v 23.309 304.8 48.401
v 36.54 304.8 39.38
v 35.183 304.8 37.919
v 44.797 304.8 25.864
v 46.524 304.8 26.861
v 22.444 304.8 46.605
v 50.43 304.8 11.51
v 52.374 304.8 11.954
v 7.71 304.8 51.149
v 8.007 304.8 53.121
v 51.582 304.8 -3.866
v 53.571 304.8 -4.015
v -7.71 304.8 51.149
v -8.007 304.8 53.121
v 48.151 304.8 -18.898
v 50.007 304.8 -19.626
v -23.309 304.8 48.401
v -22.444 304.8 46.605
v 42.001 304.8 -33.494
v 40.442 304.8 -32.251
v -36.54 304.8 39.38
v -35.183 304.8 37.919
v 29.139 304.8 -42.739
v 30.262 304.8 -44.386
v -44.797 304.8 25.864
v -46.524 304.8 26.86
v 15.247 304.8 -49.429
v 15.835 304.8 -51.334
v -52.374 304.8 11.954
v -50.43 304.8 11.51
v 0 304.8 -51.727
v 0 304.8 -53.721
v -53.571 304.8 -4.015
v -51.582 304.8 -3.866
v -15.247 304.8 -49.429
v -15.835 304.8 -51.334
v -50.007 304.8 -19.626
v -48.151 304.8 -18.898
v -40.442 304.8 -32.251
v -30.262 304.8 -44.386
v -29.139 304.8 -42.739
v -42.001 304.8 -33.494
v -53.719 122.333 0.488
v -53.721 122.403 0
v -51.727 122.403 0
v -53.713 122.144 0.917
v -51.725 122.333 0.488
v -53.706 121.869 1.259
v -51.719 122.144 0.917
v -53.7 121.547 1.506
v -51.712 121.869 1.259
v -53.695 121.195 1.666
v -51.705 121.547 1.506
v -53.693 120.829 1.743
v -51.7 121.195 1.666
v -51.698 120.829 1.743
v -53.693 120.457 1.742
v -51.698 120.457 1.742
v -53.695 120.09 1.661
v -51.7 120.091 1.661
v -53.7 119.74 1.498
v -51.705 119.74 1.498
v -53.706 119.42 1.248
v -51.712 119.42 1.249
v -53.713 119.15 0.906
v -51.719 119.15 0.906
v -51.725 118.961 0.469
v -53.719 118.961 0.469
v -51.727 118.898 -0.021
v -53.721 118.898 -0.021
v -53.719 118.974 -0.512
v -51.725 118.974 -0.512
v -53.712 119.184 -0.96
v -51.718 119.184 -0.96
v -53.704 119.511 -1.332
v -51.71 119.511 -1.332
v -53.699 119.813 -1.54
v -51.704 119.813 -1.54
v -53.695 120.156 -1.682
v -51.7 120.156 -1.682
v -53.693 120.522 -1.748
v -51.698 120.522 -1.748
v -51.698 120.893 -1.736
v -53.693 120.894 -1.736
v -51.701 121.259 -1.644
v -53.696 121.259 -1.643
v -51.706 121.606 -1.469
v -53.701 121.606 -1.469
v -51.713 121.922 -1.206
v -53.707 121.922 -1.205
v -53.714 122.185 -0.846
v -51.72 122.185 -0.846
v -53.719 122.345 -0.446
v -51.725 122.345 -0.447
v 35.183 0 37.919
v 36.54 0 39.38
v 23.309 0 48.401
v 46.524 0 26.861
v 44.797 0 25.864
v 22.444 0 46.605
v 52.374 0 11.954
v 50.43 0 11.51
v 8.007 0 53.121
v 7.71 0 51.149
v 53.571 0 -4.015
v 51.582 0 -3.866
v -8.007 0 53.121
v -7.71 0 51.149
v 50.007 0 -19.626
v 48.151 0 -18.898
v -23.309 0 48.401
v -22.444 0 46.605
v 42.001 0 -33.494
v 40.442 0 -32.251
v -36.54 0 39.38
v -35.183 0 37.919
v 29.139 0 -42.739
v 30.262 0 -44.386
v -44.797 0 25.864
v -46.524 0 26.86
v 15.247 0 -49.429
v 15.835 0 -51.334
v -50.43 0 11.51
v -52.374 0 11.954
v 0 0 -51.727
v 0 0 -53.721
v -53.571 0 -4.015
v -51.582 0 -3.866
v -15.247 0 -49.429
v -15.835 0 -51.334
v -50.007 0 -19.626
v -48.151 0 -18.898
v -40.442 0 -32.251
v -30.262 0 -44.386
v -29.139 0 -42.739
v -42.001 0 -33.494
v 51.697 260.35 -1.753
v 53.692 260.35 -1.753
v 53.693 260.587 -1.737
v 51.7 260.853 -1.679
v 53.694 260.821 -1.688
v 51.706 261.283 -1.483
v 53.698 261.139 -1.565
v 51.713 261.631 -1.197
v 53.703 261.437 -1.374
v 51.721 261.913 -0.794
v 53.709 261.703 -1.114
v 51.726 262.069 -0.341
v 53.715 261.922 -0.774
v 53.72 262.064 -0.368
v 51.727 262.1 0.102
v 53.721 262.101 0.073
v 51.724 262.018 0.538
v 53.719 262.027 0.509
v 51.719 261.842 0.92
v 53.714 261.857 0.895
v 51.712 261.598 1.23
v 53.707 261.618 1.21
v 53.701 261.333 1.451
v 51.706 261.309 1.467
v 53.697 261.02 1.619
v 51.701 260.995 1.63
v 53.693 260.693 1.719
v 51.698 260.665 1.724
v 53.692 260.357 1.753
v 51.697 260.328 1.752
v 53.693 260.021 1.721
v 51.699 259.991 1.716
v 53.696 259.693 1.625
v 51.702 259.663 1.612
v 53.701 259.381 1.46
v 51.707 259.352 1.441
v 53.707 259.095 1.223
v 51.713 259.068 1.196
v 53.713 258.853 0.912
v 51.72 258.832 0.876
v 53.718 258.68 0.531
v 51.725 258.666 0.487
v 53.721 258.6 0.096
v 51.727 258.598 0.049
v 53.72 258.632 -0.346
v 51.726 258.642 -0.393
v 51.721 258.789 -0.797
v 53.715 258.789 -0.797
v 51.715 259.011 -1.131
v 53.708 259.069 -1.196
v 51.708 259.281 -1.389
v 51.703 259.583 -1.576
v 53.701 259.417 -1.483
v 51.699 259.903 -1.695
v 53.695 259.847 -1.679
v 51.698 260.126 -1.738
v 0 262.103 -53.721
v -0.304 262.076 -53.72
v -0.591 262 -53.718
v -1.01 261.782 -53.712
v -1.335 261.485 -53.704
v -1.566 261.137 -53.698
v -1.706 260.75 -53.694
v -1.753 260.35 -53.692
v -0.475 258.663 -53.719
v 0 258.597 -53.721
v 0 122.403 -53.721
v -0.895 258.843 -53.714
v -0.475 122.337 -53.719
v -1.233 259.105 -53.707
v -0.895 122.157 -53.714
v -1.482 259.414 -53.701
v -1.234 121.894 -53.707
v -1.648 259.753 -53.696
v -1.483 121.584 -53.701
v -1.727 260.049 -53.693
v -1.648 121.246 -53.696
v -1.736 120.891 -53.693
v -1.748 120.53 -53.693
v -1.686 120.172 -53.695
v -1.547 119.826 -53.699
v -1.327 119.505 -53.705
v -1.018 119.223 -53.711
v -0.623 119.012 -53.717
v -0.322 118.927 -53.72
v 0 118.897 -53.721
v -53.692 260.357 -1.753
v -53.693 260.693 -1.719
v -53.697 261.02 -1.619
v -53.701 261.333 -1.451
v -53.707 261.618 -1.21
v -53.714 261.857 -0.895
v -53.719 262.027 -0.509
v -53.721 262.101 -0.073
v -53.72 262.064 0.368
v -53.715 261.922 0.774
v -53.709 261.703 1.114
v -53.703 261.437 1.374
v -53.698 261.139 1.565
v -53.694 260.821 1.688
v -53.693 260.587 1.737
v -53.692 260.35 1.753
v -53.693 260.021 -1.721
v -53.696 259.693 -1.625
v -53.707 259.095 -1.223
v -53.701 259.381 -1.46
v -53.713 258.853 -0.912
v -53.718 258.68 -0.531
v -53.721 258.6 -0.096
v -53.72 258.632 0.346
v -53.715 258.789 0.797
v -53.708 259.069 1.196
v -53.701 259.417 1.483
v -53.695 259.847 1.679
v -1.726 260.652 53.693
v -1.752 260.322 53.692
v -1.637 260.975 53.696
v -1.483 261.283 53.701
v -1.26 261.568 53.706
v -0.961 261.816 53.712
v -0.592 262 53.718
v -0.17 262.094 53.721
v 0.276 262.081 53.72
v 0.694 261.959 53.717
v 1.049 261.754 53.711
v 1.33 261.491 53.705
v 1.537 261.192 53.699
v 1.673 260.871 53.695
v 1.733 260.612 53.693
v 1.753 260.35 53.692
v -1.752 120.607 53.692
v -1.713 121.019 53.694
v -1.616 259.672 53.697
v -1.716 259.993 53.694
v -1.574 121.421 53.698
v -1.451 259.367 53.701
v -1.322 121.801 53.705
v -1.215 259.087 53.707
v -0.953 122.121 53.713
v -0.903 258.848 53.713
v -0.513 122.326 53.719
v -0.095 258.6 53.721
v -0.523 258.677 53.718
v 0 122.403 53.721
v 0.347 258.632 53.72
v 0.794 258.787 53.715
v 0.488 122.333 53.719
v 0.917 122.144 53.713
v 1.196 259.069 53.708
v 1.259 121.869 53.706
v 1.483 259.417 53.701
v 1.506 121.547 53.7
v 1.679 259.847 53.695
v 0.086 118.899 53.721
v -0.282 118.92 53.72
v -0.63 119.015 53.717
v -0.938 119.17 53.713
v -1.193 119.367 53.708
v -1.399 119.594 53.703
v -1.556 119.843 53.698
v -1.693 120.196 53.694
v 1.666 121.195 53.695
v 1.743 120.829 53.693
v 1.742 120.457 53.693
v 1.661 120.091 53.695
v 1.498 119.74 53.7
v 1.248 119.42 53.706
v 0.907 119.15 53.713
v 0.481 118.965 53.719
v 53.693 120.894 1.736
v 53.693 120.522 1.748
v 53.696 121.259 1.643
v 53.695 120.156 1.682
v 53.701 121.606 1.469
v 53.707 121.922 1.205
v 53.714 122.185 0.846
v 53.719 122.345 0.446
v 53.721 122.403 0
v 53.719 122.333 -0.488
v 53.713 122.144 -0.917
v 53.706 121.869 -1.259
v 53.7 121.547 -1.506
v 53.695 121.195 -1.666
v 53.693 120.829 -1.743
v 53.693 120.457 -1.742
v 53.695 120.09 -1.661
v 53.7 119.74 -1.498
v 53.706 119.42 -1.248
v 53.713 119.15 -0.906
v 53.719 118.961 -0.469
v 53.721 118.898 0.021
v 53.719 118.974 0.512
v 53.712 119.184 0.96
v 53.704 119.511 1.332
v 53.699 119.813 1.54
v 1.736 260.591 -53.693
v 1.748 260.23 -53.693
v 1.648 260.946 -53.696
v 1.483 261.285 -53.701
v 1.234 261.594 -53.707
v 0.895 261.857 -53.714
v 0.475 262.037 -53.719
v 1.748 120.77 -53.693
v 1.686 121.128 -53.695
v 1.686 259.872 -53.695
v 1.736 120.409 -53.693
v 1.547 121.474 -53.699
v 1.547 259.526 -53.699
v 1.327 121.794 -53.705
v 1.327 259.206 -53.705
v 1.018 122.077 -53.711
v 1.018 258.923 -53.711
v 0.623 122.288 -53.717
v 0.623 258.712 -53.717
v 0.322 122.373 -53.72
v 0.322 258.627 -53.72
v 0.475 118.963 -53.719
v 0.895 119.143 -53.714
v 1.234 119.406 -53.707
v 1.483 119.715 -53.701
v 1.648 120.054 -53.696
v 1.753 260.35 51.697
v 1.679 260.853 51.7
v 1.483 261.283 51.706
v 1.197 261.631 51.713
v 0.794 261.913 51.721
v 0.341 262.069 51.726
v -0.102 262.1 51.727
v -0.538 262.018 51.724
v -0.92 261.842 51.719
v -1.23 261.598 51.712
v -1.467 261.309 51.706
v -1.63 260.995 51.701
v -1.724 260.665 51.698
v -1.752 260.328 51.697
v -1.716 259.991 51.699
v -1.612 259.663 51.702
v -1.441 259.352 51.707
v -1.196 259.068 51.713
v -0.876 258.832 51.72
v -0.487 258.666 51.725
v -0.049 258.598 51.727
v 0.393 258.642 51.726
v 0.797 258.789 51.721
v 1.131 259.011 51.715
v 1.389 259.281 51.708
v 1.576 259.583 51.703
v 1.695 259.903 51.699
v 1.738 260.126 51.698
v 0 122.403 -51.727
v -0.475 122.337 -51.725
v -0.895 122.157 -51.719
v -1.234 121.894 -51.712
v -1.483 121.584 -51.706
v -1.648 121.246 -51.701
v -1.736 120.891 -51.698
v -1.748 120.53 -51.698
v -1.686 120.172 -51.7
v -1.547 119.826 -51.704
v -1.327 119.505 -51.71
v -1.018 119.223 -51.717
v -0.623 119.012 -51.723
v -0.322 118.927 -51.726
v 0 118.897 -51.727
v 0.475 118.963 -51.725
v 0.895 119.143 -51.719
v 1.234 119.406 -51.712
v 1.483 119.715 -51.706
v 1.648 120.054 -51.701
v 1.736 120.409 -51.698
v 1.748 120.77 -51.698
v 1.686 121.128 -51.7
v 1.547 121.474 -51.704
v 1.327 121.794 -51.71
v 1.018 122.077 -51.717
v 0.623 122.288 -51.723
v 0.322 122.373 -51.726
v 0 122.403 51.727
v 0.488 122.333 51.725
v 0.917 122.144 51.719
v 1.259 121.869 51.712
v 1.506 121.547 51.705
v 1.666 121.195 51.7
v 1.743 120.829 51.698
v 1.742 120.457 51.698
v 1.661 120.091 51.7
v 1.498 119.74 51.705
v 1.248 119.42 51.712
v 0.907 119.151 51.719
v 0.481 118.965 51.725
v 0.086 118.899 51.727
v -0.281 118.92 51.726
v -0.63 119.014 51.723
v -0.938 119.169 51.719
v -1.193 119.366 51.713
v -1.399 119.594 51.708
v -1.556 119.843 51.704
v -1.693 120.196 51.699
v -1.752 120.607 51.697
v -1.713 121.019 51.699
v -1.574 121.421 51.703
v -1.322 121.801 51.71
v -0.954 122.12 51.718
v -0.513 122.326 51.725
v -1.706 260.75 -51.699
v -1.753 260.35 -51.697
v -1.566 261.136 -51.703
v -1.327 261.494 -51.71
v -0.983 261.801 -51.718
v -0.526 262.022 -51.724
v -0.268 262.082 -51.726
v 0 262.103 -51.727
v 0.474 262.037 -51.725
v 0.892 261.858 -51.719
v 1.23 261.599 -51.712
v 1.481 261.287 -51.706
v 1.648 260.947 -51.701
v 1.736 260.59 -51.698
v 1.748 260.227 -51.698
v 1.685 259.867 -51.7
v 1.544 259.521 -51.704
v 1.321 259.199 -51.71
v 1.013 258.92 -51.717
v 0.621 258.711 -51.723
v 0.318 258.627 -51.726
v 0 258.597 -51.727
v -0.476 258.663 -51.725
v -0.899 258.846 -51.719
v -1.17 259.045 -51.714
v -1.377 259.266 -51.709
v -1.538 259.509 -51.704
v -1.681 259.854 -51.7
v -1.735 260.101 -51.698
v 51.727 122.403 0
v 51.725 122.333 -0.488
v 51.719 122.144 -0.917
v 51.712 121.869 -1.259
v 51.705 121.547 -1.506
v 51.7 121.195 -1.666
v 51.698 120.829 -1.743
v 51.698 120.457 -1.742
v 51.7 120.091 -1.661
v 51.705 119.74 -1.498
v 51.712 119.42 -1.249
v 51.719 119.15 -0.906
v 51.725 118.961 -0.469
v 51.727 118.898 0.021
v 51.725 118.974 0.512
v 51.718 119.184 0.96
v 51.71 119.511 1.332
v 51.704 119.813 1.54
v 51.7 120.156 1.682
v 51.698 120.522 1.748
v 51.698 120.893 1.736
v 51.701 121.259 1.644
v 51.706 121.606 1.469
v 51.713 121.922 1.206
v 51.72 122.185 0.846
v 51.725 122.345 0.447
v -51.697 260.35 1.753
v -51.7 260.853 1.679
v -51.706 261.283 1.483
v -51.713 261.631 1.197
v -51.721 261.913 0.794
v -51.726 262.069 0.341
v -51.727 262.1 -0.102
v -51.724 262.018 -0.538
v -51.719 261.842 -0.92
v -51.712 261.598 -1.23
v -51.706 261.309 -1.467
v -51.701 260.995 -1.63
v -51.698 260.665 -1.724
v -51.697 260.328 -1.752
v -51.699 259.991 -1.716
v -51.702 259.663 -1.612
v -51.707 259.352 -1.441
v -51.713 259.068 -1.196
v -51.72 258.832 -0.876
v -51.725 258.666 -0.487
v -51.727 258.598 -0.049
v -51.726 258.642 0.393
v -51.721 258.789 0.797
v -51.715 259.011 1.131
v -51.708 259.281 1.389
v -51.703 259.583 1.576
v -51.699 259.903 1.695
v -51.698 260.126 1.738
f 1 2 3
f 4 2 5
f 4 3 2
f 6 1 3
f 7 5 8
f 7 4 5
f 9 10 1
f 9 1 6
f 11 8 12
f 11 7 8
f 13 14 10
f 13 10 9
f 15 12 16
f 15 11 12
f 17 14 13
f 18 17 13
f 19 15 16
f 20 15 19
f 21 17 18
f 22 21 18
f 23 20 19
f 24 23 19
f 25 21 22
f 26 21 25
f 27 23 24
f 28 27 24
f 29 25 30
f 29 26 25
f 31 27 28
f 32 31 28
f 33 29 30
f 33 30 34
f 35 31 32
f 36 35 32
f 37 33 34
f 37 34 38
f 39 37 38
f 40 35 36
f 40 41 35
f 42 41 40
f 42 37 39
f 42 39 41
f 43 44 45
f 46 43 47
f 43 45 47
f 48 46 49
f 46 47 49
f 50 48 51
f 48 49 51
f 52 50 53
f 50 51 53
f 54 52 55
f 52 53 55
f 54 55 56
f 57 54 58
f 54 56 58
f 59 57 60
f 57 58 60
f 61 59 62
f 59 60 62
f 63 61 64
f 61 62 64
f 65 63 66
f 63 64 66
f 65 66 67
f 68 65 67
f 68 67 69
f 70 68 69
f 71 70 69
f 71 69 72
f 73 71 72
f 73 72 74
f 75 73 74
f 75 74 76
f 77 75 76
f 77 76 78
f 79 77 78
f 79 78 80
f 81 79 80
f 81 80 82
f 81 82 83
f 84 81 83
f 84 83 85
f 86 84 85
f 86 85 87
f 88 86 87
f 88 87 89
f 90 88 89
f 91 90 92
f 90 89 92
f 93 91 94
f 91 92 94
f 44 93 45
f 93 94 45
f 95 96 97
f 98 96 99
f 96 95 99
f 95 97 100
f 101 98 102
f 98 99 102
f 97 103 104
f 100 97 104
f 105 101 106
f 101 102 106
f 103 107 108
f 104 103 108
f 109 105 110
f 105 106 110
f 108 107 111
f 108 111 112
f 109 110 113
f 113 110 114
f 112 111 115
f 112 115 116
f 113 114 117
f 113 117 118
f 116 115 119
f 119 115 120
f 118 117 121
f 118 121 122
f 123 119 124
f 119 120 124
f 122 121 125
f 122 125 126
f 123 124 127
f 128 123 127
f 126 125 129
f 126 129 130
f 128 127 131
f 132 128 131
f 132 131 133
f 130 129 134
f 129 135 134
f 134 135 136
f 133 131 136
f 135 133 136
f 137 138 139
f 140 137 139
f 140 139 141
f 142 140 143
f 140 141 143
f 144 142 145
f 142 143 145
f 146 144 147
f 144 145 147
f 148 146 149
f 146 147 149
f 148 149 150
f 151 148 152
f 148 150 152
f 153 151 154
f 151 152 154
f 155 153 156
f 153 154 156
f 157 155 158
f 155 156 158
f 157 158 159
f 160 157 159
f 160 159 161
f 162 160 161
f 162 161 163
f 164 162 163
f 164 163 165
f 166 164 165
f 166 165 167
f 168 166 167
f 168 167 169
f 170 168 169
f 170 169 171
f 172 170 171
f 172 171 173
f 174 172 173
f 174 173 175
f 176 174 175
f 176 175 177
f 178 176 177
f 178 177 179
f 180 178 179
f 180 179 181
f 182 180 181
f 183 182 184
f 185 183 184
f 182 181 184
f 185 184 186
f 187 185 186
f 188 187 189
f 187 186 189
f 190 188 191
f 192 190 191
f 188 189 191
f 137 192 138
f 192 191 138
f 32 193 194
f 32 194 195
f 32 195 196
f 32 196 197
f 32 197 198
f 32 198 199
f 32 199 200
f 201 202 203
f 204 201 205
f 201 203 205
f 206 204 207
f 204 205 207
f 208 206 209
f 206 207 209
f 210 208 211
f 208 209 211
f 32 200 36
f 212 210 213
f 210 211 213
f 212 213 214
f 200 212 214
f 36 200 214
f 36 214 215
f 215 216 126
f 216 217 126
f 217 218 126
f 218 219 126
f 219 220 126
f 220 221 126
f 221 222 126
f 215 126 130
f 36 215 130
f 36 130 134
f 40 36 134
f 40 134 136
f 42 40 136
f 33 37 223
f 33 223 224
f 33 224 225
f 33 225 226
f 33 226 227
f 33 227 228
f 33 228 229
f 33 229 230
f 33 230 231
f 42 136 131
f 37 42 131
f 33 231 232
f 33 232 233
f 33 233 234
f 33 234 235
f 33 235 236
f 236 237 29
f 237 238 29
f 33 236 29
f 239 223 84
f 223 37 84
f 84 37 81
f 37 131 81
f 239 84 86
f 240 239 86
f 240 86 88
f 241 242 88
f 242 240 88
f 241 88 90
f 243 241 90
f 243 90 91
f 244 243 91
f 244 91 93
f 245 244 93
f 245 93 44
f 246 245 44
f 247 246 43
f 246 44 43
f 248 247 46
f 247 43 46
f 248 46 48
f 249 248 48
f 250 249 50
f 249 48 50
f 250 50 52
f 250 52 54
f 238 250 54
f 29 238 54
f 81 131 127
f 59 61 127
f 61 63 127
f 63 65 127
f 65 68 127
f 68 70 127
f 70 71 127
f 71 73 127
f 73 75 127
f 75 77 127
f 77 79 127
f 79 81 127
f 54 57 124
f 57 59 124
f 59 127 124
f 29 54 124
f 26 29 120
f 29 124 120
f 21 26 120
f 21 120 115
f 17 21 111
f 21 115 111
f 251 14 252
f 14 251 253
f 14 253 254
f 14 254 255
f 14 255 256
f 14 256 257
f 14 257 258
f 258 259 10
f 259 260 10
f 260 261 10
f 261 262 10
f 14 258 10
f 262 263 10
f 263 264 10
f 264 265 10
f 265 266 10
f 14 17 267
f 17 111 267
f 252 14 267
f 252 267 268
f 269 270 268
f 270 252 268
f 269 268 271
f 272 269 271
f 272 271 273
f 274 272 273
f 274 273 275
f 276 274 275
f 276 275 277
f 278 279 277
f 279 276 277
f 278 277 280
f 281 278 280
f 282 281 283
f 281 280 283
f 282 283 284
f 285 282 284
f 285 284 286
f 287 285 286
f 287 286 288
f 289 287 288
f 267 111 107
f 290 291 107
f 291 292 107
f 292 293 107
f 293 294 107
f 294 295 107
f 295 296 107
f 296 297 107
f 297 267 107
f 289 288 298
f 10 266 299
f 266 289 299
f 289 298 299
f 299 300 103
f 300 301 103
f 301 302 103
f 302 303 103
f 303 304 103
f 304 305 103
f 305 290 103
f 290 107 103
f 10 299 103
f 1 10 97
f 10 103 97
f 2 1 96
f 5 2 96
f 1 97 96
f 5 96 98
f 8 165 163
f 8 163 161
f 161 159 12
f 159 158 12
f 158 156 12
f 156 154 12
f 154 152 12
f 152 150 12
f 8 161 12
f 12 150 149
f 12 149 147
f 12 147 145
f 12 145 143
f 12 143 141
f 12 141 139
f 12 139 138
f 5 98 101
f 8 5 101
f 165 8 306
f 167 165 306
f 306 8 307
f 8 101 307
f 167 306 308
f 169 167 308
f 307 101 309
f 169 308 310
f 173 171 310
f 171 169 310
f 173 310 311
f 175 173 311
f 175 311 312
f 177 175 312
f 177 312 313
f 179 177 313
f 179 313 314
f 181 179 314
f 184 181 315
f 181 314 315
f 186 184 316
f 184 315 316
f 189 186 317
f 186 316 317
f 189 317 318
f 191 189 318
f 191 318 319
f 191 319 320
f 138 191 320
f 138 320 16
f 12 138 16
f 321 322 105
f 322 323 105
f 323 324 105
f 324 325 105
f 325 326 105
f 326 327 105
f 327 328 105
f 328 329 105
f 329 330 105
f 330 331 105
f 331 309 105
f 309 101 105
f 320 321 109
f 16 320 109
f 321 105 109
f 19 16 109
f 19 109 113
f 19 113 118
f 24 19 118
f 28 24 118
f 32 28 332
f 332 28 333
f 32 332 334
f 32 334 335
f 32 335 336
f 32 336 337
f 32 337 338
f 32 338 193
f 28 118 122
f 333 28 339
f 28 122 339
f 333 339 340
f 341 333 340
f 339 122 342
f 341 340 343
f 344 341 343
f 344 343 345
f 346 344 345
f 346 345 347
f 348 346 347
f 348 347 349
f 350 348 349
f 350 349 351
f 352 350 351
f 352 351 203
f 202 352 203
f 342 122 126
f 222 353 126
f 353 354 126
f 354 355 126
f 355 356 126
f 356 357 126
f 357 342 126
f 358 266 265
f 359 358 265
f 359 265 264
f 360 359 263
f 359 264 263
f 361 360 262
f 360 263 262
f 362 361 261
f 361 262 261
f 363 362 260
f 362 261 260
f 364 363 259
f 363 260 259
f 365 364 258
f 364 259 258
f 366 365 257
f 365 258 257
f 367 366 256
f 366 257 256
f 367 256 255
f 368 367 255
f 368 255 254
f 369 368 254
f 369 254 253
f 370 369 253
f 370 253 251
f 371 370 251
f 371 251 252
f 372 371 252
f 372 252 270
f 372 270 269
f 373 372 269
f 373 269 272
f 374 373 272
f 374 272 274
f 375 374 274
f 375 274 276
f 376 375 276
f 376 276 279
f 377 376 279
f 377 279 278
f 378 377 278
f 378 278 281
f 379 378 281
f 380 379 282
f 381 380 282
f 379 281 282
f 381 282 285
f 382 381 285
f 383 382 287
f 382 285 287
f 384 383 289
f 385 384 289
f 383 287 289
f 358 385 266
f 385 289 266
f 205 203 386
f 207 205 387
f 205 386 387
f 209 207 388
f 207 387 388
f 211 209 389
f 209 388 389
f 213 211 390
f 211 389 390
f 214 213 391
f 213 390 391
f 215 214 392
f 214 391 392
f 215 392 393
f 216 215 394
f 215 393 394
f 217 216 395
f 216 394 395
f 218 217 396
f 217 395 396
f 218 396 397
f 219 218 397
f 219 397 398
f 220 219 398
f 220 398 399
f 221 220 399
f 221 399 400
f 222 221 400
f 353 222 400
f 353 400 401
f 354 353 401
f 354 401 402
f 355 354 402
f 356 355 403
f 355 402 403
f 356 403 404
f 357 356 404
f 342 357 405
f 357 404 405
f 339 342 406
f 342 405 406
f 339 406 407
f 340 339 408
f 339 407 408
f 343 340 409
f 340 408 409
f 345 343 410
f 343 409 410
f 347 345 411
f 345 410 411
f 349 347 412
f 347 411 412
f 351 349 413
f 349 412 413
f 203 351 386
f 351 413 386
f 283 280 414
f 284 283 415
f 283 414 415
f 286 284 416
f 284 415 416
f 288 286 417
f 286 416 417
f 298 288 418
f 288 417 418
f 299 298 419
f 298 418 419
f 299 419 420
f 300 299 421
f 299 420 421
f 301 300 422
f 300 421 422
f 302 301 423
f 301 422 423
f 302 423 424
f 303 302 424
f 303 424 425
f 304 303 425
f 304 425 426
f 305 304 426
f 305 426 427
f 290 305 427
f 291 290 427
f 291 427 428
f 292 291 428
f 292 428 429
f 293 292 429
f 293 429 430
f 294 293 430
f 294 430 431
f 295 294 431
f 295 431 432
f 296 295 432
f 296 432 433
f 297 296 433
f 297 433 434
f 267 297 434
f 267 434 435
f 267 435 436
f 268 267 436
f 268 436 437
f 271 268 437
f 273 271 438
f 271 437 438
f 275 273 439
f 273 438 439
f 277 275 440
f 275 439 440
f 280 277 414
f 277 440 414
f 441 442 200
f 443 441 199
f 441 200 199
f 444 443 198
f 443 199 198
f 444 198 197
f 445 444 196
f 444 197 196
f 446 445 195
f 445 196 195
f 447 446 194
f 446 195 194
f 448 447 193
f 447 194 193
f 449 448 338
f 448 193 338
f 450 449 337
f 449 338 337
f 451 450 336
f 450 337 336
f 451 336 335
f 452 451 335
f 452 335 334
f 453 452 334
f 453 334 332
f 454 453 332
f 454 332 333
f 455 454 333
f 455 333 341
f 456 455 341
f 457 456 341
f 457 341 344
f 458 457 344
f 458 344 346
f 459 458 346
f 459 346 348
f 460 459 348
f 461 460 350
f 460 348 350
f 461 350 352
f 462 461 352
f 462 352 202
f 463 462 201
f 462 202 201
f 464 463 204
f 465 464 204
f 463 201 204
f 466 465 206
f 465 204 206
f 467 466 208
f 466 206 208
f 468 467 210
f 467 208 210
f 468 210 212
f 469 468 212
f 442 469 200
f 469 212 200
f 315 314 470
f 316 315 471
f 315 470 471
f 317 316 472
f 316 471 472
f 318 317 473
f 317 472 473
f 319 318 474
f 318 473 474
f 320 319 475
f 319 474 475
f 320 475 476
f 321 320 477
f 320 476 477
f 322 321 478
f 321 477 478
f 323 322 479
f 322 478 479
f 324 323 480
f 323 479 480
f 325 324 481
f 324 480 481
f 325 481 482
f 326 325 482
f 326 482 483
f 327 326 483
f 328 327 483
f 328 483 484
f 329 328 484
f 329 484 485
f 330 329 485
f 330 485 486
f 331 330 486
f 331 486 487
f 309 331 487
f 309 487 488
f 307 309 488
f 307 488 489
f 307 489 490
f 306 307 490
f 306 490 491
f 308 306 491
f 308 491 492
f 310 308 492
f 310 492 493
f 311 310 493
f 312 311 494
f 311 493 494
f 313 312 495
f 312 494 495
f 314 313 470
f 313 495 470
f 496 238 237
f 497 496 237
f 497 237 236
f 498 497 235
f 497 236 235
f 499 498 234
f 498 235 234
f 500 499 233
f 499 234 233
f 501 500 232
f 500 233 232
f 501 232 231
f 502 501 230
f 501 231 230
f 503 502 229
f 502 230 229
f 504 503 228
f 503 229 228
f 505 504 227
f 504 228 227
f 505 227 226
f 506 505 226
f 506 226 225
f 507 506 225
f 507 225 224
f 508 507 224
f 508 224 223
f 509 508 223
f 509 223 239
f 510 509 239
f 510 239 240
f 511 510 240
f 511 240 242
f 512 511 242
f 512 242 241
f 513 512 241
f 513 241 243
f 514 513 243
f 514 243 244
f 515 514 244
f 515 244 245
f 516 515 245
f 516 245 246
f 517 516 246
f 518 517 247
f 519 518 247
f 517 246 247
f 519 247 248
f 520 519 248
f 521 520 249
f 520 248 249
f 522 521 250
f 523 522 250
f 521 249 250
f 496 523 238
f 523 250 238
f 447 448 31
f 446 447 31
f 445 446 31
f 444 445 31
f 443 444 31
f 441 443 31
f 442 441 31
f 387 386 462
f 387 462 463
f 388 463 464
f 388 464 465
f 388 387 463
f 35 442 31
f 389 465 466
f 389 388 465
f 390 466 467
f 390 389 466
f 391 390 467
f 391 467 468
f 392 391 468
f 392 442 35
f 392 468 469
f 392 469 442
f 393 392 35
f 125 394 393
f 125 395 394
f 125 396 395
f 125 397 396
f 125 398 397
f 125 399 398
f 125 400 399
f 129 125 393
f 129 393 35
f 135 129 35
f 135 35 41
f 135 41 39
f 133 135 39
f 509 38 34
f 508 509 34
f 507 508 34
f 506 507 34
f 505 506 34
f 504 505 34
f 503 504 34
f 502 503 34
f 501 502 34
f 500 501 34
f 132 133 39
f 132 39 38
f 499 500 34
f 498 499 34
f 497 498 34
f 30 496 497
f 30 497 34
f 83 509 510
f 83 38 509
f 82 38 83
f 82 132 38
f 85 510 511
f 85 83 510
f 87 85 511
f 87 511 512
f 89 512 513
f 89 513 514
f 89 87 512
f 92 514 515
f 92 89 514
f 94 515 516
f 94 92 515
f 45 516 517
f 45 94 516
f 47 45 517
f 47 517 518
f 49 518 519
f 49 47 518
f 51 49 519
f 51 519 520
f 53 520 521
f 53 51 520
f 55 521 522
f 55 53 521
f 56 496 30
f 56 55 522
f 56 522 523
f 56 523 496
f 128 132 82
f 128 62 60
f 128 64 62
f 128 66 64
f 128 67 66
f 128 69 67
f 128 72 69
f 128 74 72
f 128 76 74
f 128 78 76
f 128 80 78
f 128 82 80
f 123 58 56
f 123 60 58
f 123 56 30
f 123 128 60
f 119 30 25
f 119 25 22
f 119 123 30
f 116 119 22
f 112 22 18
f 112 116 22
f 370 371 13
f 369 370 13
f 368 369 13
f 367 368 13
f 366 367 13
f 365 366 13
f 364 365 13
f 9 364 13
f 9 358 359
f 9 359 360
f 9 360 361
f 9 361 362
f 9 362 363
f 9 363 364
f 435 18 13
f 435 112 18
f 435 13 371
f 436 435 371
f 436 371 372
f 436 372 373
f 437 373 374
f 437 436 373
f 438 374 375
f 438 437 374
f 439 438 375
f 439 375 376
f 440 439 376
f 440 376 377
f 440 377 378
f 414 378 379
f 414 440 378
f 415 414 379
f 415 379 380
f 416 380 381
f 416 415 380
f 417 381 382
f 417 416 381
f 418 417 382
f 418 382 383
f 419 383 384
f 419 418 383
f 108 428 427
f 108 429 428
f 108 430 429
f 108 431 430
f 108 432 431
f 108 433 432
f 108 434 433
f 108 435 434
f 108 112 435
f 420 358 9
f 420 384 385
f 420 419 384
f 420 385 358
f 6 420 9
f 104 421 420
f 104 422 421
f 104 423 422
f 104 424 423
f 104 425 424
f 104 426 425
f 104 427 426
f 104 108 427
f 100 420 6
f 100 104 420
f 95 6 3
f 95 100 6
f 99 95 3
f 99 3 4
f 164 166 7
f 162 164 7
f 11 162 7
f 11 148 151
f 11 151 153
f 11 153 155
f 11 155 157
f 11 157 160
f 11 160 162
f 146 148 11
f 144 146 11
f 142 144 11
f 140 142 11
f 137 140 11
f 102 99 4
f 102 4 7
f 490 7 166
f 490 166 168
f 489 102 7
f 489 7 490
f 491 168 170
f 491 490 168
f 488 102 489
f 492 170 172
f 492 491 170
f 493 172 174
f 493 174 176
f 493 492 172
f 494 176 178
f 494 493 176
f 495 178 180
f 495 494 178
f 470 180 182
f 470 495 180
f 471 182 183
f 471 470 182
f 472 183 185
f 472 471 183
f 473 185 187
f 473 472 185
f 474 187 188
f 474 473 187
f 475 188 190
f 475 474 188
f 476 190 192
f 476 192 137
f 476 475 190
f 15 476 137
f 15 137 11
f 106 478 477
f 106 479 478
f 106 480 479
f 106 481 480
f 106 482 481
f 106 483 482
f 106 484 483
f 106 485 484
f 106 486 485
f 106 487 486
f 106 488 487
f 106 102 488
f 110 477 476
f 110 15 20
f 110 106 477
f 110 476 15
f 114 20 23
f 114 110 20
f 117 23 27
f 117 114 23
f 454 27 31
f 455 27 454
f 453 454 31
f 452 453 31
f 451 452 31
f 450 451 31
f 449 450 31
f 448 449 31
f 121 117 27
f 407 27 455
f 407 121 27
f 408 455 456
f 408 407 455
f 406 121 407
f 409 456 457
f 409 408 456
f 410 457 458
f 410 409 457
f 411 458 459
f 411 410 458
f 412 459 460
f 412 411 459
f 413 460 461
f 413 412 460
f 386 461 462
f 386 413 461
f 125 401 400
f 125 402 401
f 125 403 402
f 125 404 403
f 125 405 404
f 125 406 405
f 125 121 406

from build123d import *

# Parameters (mm, degrees)
SKETCH1_R               = 53.721
SKETCH1_R_2             = 51.7271
BOSS_EXTRUDE1_DEPTH     = 304.8
SKETCH2_R               = 1.7526
BULKHEAD_HOLES_DEPTH    = 127
CIRPATTERN1_COUNT       = 4
CUT_EXTRUDE1_REACH      = 329.617
CUT_EXTRUDE1_END_RADIUS = 51.7271
SKETCH3_R               = 1.7526
CIRPATTERN2_COUNT       = 4


with BuildPart() as part:
    # Sketch1 → Boss-Extrude1 (new body)
    with BuildSketch(Plane(origin=(0, 0, 0), x_dir=(1, 0, 0), z_dir=(0, 1, 0))):
        with Locations(Location((0, 0, 0), (0, 0, 90))):
            Circle(SKETCH1_R)
        with Locations(Location((0, 0, 0), (0, 0, 90))):
            Circle(SKETCH1_R_2, mode=Mode.SUBTRACT)
    extrude(amount=BOSS_EXTRUDE1_DEPTH)

    # Sketch2 → Bulkhead Holes (cut)
    with BuildSketch(Plane.XY):
        with Locations(Location((0, 120.65, 0), (0, 0, 90))):
            Circle(SKETCH2_R)
    bulkhead_holes = extrude(amount=-BULKHEAD_HOLES_DEPTH, mode=Mode.SUBTRACT)

    # CirPattern1: Bulkhead Holes ×4 about axis
    cirpattern1_axis = Axis((0, 304.8, 0), (0, -1, 0))
    for i in range(1, CIRPATTERN1_COUNT):
        add(bulkhead_holes.rotate(cirpattern1_axis, i * 360 / CIRPATTERN1_COUNT), mode=Mode.SUBTRACT)

    # Cut-Extrude1: up to this cylinder (the profile starts outside it)
    cut_extrude1_end = Plane(origin=(0, 260.35, 0), z_dir=(0, -1, 0)) * Cylinder(CUT_EXTRUDE1_END_RADIUS, 763.6882, mode=Mode.PRIVATE)
    # Sketch3 → Cut-Extrude1 (cut, up to the surface)
    with BuildSketch(Plane(origin=(53.721, 0, 0), x_dir=(0, 0, -1), z_dir=(1, 0, 0)), mode=Mode.PRIVATE) as cut_extrude1_sk1:
        with Locations((0, 260.35)):
            Circle(SKETCH3_R)
    cut_extrude1_tool1 = extrude(cut_extrude1_sk1.sketch, amount=-CUT_EXTRUDE1_REACH, mode=Mode.PRIVATE) - cut_extrude1_end
    cut_extrude1 = cut_extrude1_tool1.solids().sort_by_distance((53.721, 260.35, 0))[0]
    add(cut_extrude1, mode=Mode.SUBTRACT)

    # CirPattern2: Cut-Extrude1 ×4 about axis
    cirpattern2_axis = Axis((0, 304.8, 0), (0, -1, 0))
    for i in range(1, CIRPATTERN2_COUNT):
        add(cut_extrude1.rotate(cirpattern2_axis, i * 360 / CIRPATTERN2_COUNT), mode=Mode.SUBTRACT)


solid = part.part
